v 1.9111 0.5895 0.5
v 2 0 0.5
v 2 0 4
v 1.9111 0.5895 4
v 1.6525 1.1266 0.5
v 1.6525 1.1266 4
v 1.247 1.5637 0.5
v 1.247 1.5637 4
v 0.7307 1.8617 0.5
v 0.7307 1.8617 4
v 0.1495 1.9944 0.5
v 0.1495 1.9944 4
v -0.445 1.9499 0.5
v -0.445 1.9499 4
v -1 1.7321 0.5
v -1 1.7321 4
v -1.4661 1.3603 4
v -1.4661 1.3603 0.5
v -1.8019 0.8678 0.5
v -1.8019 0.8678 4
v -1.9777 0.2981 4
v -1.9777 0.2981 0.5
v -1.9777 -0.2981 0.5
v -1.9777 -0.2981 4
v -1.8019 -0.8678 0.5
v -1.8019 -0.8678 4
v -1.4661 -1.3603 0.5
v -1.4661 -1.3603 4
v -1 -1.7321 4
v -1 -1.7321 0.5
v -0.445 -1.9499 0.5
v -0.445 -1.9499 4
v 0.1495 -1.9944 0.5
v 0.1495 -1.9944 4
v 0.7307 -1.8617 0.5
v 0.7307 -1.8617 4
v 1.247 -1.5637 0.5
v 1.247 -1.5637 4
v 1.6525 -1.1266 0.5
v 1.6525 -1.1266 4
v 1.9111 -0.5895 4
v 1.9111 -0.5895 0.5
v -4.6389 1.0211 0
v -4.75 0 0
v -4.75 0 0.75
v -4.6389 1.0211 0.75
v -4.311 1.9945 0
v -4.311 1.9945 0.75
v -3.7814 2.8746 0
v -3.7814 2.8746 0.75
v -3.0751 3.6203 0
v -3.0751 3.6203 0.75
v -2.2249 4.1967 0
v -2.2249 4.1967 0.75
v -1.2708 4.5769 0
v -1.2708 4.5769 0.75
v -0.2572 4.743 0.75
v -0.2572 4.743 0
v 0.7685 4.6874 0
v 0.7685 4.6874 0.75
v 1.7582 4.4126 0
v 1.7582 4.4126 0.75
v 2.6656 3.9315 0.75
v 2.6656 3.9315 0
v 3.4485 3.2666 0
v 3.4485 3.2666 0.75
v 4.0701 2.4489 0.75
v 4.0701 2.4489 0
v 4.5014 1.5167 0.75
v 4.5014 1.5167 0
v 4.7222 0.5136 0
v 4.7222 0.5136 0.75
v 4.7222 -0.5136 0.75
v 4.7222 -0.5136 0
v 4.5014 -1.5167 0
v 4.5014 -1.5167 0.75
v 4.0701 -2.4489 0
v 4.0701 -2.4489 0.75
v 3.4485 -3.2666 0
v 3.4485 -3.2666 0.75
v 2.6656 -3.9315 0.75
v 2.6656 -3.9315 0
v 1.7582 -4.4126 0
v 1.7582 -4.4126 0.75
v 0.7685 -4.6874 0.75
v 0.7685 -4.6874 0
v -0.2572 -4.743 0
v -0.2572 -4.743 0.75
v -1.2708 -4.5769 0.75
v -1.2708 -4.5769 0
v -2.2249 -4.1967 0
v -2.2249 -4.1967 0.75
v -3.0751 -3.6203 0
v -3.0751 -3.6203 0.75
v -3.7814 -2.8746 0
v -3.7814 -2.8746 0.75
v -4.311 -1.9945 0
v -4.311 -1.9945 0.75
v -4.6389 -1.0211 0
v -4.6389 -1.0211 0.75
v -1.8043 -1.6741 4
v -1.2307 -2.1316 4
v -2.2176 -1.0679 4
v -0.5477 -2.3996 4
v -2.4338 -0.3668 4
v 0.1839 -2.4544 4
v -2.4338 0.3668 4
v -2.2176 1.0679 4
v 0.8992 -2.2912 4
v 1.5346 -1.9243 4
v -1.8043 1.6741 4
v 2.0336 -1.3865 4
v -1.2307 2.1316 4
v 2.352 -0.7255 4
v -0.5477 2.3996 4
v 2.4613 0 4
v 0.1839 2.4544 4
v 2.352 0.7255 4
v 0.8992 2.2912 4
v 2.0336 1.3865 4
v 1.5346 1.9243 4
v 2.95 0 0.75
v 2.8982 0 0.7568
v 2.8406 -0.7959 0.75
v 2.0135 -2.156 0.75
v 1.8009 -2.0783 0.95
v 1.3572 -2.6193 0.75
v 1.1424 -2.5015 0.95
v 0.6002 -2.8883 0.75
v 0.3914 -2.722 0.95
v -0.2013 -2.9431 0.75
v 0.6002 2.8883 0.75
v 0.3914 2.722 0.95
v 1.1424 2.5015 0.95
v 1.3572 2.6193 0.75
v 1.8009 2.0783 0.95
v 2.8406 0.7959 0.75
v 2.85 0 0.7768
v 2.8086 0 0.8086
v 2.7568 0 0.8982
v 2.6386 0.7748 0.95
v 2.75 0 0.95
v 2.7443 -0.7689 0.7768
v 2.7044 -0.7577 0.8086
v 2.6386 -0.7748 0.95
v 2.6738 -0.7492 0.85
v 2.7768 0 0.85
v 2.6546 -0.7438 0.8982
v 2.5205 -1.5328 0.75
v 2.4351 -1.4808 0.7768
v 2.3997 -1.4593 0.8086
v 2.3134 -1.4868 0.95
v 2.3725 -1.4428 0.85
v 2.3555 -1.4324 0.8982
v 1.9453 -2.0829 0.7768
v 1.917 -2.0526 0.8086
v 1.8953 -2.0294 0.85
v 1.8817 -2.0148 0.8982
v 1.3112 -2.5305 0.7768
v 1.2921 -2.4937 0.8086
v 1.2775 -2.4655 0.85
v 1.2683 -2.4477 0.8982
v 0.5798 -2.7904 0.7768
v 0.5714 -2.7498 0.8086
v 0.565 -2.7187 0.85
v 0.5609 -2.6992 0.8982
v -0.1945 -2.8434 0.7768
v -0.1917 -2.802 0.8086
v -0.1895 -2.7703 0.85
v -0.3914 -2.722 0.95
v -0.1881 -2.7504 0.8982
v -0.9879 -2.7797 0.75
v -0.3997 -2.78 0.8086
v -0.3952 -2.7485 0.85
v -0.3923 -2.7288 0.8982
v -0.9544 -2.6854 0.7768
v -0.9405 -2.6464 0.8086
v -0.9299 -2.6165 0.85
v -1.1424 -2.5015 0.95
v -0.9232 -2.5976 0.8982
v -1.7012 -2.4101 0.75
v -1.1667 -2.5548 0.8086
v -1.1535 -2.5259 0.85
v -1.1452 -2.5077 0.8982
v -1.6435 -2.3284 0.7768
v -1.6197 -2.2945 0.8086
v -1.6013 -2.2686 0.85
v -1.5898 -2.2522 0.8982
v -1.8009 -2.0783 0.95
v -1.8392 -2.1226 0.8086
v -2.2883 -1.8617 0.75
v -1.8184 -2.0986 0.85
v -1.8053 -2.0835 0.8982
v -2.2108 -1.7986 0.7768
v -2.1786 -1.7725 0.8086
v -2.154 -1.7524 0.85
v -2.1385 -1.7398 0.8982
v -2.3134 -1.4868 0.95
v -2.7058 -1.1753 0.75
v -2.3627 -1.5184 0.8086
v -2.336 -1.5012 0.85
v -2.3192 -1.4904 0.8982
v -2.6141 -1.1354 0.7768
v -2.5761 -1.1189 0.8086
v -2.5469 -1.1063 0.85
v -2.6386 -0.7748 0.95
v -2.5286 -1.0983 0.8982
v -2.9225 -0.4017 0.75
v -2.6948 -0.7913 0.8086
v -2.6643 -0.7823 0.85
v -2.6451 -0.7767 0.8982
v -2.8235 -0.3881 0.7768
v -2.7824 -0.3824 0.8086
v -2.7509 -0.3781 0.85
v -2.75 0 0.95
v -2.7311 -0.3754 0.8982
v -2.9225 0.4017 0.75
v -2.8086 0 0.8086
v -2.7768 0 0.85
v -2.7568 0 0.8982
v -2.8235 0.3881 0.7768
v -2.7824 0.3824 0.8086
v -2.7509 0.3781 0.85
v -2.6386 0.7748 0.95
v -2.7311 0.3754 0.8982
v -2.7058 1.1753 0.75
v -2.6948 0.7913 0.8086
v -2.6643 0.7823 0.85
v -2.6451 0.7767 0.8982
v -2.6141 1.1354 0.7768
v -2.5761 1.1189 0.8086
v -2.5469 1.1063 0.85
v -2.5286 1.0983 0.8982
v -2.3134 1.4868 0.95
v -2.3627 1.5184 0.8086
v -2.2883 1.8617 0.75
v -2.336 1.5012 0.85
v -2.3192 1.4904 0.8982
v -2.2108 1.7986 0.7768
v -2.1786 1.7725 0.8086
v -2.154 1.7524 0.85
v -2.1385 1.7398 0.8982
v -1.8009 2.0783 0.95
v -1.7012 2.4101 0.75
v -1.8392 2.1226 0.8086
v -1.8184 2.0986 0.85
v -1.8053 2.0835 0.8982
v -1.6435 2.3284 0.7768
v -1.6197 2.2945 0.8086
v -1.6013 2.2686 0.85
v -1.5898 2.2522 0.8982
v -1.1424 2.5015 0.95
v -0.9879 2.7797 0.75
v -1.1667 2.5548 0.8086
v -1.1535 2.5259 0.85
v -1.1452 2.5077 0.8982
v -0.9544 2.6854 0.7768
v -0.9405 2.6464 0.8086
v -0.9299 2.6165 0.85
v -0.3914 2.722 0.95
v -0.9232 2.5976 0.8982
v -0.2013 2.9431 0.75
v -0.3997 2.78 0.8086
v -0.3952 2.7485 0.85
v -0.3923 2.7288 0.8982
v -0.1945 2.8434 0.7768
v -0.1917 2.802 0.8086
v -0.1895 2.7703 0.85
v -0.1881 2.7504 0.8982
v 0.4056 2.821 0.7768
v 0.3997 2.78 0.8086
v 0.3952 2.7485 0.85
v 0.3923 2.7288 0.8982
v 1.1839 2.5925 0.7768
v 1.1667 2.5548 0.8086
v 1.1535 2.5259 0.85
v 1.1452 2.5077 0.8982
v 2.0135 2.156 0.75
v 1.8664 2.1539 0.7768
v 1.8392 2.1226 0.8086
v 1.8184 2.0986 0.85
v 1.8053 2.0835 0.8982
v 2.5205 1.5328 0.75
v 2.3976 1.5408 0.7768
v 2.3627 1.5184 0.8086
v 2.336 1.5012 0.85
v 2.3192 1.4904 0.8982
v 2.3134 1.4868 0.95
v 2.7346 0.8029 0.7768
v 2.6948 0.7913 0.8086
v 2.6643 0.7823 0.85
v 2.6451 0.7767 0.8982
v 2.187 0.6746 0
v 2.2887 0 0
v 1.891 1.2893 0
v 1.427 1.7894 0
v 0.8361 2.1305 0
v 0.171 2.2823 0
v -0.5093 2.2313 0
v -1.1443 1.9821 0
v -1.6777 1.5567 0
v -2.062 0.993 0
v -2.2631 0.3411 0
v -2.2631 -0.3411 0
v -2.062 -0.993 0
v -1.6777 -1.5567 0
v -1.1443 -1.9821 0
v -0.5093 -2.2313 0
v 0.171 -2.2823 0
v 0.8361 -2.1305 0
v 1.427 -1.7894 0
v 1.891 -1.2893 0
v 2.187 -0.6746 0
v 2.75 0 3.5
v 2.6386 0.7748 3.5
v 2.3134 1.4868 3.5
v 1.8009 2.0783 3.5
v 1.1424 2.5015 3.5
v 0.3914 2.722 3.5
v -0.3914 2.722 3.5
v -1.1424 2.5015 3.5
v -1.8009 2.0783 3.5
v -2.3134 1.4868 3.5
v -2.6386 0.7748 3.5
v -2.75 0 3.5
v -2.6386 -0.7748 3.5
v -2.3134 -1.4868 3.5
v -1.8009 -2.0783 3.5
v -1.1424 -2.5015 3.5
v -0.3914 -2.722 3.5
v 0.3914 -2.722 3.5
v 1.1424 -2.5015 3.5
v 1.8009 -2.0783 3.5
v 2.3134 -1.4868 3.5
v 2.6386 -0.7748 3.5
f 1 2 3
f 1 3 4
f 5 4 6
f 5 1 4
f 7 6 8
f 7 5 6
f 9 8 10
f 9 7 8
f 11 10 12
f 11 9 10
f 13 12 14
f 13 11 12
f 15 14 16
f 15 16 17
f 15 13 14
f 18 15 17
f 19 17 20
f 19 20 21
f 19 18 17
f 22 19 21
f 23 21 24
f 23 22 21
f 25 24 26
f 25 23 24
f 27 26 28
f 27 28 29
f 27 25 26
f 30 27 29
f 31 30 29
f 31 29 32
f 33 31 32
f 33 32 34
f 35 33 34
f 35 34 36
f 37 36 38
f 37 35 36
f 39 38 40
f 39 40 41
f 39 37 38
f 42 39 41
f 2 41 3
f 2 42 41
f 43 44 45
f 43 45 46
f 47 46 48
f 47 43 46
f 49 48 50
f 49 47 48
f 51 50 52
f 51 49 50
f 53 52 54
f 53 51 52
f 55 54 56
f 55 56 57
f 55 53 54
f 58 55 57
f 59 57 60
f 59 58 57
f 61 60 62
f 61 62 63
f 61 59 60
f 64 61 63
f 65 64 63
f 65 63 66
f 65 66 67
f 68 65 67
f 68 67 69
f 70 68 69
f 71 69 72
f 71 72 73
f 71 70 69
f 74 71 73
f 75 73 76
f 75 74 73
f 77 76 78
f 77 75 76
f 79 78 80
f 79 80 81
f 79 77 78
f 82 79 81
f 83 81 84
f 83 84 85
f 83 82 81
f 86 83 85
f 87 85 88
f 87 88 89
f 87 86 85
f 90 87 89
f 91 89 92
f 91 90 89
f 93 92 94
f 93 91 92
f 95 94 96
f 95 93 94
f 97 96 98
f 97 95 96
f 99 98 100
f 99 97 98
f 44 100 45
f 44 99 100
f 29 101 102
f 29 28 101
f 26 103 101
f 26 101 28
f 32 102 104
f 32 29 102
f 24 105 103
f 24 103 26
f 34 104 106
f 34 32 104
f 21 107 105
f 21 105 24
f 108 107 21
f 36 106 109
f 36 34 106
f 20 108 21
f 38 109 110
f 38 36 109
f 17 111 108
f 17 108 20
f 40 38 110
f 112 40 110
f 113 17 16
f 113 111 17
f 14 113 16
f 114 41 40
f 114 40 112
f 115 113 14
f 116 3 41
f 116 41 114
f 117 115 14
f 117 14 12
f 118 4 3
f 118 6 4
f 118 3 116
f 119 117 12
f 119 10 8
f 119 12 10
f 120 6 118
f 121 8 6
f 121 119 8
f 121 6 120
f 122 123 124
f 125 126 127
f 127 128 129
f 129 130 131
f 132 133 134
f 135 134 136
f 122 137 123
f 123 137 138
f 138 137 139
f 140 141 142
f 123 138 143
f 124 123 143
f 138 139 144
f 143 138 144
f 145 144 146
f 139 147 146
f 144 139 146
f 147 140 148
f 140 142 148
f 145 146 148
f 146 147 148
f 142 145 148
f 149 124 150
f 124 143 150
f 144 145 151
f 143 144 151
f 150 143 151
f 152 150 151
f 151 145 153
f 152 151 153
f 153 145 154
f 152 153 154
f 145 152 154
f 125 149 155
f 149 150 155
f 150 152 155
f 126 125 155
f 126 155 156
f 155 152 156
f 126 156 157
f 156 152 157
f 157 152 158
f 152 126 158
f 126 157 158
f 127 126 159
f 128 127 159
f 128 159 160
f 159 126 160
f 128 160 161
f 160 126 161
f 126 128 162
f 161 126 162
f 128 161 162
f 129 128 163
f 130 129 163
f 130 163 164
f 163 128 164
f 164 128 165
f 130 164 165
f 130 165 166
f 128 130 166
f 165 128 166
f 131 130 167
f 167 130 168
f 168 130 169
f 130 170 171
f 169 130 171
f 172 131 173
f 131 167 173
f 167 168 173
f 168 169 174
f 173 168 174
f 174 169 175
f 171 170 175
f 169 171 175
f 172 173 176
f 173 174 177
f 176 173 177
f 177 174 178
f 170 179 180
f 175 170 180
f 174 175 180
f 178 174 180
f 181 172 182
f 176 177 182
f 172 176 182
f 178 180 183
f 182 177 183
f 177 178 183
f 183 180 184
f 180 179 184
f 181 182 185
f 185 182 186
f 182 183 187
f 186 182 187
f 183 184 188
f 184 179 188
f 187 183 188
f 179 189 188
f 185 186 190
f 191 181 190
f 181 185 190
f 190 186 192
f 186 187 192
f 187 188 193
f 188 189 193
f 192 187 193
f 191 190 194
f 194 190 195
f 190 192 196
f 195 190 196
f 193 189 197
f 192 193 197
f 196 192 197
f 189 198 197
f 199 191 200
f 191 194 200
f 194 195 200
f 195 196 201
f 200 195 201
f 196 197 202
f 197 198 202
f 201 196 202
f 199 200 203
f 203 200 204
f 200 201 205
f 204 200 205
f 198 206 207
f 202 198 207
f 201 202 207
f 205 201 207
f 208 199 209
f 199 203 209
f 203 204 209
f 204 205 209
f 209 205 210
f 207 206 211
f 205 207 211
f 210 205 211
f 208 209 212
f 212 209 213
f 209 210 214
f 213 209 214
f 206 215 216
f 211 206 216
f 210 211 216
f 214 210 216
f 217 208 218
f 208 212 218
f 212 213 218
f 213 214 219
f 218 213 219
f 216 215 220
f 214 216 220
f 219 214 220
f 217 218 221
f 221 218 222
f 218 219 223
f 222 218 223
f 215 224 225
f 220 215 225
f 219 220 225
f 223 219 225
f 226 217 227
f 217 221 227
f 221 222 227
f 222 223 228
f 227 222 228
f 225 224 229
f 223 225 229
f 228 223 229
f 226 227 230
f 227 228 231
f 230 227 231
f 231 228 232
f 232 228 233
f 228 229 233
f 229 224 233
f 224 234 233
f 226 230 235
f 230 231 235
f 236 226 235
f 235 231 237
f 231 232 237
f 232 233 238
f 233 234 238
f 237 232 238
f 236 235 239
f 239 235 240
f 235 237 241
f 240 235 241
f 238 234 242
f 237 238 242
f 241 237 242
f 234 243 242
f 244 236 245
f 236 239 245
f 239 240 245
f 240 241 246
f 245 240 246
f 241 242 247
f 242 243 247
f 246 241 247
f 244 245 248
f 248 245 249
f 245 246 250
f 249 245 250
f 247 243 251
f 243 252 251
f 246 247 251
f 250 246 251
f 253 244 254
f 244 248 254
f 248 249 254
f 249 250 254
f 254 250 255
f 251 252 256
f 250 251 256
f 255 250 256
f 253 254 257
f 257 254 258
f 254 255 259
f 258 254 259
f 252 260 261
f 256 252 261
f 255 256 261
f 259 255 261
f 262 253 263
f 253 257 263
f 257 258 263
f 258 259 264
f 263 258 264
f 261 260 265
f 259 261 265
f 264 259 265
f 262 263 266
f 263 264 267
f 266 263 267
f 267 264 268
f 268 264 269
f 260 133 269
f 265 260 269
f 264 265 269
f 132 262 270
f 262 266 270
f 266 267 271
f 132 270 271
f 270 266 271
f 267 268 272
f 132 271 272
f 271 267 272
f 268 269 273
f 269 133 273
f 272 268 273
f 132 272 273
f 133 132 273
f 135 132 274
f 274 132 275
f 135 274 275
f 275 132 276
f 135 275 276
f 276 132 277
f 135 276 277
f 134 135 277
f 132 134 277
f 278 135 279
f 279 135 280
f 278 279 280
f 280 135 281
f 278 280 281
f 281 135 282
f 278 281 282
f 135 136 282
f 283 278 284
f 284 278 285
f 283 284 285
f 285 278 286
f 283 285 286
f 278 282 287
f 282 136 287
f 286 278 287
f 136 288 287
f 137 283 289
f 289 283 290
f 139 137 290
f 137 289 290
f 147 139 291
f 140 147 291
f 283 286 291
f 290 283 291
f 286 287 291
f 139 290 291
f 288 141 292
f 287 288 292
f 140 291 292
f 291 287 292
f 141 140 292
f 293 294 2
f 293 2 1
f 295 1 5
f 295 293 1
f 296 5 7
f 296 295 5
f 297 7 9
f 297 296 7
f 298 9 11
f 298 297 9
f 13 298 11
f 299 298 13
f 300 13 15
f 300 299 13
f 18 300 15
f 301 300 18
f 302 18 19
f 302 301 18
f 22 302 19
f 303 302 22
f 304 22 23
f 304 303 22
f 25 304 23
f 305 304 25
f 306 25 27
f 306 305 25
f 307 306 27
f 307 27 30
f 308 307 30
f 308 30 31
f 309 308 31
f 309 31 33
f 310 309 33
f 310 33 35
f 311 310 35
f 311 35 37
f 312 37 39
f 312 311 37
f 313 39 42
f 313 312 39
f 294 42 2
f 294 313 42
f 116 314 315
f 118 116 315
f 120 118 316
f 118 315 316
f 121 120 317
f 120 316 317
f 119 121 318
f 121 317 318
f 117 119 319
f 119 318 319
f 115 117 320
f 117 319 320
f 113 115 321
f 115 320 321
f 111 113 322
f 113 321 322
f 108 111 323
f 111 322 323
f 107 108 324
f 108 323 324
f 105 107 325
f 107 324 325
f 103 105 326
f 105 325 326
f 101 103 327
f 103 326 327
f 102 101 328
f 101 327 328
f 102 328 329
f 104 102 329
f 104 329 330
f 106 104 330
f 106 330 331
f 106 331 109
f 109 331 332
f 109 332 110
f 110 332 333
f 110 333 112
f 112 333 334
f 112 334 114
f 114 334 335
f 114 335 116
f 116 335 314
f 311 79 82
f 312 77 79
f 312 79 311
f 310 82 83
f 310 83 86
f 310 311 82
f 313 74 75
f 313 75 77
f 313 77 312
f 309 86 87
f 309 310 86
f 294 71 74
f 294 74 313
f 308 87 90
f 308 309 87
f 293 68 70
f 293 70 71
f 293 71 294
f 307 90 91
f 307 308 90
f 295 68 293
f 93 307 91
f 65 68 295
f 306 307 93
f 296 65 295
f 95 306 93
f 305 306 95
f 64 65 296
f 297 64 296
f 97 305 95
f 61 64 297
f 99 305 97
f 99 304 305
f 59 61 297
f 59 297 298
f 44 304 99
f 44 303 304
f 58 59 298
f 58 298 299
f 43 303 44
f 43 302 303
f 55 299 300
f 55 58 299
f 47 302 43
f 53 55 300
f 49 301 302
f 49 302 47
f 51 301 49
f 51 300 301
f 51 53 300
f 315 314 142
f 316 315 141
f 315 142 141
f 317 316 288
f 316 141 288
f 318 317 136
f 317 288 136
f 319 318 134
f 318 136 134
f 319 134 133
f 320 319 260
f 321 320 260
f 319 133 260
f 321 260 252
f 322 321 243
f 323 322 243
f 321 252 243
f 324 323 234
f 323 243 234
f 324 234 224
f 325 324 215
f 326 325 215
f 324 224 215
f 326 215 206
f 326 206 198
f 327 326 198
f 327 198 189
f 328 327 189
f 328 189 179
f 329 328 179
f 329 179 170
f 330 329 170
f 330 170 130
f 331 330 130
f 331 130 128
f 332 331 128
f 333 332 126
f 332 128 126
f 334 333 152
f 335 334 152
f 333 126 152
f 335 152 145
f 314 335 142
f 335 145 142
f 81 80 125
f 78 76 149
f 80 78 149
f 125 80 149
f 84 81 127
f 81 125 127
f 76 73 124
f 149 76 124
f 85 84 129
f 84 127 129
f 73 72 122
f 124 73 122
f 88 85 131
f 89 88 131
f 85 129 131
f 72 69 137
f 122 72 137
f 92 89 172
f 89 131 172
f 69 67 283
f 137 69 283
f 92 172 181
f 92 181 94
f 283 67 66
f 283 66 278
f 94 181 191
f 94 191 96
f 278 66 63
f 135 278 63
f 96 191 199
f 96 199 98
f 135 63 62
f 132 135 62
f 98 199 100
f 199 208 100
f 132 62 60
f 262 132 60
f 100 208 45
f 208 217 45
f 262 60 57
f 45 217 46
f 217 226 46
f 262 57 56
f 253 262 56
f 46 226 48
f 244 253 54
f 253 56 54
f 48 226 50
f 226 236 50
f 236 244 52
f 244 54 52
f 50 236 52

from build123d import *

# Parameters (mm, degrees)
SKICA1_R        = 2.75
SKICA1_R_2      = 2
VYSUNOUT1_DEPTH = 4
SKICA2_R        = 4.75
SKICA2_R_2      = 2.75
VYSUNOUT2_DEPTH = 0.75
ZAOBLIT1_R      = 0.2
ZKOSIT1_SIZE    = 0.5
ZKOSIT1_SIZE2   = 0.288675135
ZKOSIT2_SIZE    = 0.288675135
ZKOSIT2_SIZE2   = 0.5


with BuildPart() as part:
    # Skica1 → Vysunout1 (new body)
    with BuildSketch(Plane.XY):
        Circle(SKICA1_R)
        Circle(SKICA1_R_2, mode=Mode.SUBTRACT)
    extrude(amount=VYSUNOUT1_DEPTH)

    # Skica2 → Vysunout2 (add)
    with BuildSketch(Plane(origin=(0, 0, 0), x_dir=(-1, 0, 0), z_dir=(0, 0, -1))):
        Circle(SKICA2_R)
        Circle(SKICA2_R_2, mode=Mode.SUBTRACT)
    extrude(amount=-VYSUNOUT2_DEPTH)

    # Zaoblit1
    zaoblit1_edges = [part.edges().sort_by_distance(p)[0] for p in [
        (-2.75, 0, 0.75),
    ]]
    fillet(zaoblit1_edges, radius=ZAOBLIT1_R)

    # Zkosit1
    zkosit1_edges = [part.edges().sort_by_distance(p)[0] for p in [
        (-2, 0, 0),
    ]]
    zkosit1_side = [part.faces().sort_by_distance(p)[0] for p in [
        (-2, 0, 2),
    ]]
    chamfer(zkosit1_edges, length=ZKOSIT1_SIZE, length2=ZKOSIT1_SIZE2, reference=zkosit1_side[0])

    # Zkosit2
    zkosit2_edges = [part.edges().sort_by_distance(p)[0] for p in [
        (-2.75, 0, 4),
    ]]
    zkosit2_side = [part.faces().sort_by_distance(p)[0] for p in [
        (-2.672218254, 0, 4),
    ]]
    chamfer(zkosit2_edges, length=ZKOSIT2_SIZE, length2=ZKOSIT2_SIZE2, reference=zkosit2_side[0])


solid = part.part
